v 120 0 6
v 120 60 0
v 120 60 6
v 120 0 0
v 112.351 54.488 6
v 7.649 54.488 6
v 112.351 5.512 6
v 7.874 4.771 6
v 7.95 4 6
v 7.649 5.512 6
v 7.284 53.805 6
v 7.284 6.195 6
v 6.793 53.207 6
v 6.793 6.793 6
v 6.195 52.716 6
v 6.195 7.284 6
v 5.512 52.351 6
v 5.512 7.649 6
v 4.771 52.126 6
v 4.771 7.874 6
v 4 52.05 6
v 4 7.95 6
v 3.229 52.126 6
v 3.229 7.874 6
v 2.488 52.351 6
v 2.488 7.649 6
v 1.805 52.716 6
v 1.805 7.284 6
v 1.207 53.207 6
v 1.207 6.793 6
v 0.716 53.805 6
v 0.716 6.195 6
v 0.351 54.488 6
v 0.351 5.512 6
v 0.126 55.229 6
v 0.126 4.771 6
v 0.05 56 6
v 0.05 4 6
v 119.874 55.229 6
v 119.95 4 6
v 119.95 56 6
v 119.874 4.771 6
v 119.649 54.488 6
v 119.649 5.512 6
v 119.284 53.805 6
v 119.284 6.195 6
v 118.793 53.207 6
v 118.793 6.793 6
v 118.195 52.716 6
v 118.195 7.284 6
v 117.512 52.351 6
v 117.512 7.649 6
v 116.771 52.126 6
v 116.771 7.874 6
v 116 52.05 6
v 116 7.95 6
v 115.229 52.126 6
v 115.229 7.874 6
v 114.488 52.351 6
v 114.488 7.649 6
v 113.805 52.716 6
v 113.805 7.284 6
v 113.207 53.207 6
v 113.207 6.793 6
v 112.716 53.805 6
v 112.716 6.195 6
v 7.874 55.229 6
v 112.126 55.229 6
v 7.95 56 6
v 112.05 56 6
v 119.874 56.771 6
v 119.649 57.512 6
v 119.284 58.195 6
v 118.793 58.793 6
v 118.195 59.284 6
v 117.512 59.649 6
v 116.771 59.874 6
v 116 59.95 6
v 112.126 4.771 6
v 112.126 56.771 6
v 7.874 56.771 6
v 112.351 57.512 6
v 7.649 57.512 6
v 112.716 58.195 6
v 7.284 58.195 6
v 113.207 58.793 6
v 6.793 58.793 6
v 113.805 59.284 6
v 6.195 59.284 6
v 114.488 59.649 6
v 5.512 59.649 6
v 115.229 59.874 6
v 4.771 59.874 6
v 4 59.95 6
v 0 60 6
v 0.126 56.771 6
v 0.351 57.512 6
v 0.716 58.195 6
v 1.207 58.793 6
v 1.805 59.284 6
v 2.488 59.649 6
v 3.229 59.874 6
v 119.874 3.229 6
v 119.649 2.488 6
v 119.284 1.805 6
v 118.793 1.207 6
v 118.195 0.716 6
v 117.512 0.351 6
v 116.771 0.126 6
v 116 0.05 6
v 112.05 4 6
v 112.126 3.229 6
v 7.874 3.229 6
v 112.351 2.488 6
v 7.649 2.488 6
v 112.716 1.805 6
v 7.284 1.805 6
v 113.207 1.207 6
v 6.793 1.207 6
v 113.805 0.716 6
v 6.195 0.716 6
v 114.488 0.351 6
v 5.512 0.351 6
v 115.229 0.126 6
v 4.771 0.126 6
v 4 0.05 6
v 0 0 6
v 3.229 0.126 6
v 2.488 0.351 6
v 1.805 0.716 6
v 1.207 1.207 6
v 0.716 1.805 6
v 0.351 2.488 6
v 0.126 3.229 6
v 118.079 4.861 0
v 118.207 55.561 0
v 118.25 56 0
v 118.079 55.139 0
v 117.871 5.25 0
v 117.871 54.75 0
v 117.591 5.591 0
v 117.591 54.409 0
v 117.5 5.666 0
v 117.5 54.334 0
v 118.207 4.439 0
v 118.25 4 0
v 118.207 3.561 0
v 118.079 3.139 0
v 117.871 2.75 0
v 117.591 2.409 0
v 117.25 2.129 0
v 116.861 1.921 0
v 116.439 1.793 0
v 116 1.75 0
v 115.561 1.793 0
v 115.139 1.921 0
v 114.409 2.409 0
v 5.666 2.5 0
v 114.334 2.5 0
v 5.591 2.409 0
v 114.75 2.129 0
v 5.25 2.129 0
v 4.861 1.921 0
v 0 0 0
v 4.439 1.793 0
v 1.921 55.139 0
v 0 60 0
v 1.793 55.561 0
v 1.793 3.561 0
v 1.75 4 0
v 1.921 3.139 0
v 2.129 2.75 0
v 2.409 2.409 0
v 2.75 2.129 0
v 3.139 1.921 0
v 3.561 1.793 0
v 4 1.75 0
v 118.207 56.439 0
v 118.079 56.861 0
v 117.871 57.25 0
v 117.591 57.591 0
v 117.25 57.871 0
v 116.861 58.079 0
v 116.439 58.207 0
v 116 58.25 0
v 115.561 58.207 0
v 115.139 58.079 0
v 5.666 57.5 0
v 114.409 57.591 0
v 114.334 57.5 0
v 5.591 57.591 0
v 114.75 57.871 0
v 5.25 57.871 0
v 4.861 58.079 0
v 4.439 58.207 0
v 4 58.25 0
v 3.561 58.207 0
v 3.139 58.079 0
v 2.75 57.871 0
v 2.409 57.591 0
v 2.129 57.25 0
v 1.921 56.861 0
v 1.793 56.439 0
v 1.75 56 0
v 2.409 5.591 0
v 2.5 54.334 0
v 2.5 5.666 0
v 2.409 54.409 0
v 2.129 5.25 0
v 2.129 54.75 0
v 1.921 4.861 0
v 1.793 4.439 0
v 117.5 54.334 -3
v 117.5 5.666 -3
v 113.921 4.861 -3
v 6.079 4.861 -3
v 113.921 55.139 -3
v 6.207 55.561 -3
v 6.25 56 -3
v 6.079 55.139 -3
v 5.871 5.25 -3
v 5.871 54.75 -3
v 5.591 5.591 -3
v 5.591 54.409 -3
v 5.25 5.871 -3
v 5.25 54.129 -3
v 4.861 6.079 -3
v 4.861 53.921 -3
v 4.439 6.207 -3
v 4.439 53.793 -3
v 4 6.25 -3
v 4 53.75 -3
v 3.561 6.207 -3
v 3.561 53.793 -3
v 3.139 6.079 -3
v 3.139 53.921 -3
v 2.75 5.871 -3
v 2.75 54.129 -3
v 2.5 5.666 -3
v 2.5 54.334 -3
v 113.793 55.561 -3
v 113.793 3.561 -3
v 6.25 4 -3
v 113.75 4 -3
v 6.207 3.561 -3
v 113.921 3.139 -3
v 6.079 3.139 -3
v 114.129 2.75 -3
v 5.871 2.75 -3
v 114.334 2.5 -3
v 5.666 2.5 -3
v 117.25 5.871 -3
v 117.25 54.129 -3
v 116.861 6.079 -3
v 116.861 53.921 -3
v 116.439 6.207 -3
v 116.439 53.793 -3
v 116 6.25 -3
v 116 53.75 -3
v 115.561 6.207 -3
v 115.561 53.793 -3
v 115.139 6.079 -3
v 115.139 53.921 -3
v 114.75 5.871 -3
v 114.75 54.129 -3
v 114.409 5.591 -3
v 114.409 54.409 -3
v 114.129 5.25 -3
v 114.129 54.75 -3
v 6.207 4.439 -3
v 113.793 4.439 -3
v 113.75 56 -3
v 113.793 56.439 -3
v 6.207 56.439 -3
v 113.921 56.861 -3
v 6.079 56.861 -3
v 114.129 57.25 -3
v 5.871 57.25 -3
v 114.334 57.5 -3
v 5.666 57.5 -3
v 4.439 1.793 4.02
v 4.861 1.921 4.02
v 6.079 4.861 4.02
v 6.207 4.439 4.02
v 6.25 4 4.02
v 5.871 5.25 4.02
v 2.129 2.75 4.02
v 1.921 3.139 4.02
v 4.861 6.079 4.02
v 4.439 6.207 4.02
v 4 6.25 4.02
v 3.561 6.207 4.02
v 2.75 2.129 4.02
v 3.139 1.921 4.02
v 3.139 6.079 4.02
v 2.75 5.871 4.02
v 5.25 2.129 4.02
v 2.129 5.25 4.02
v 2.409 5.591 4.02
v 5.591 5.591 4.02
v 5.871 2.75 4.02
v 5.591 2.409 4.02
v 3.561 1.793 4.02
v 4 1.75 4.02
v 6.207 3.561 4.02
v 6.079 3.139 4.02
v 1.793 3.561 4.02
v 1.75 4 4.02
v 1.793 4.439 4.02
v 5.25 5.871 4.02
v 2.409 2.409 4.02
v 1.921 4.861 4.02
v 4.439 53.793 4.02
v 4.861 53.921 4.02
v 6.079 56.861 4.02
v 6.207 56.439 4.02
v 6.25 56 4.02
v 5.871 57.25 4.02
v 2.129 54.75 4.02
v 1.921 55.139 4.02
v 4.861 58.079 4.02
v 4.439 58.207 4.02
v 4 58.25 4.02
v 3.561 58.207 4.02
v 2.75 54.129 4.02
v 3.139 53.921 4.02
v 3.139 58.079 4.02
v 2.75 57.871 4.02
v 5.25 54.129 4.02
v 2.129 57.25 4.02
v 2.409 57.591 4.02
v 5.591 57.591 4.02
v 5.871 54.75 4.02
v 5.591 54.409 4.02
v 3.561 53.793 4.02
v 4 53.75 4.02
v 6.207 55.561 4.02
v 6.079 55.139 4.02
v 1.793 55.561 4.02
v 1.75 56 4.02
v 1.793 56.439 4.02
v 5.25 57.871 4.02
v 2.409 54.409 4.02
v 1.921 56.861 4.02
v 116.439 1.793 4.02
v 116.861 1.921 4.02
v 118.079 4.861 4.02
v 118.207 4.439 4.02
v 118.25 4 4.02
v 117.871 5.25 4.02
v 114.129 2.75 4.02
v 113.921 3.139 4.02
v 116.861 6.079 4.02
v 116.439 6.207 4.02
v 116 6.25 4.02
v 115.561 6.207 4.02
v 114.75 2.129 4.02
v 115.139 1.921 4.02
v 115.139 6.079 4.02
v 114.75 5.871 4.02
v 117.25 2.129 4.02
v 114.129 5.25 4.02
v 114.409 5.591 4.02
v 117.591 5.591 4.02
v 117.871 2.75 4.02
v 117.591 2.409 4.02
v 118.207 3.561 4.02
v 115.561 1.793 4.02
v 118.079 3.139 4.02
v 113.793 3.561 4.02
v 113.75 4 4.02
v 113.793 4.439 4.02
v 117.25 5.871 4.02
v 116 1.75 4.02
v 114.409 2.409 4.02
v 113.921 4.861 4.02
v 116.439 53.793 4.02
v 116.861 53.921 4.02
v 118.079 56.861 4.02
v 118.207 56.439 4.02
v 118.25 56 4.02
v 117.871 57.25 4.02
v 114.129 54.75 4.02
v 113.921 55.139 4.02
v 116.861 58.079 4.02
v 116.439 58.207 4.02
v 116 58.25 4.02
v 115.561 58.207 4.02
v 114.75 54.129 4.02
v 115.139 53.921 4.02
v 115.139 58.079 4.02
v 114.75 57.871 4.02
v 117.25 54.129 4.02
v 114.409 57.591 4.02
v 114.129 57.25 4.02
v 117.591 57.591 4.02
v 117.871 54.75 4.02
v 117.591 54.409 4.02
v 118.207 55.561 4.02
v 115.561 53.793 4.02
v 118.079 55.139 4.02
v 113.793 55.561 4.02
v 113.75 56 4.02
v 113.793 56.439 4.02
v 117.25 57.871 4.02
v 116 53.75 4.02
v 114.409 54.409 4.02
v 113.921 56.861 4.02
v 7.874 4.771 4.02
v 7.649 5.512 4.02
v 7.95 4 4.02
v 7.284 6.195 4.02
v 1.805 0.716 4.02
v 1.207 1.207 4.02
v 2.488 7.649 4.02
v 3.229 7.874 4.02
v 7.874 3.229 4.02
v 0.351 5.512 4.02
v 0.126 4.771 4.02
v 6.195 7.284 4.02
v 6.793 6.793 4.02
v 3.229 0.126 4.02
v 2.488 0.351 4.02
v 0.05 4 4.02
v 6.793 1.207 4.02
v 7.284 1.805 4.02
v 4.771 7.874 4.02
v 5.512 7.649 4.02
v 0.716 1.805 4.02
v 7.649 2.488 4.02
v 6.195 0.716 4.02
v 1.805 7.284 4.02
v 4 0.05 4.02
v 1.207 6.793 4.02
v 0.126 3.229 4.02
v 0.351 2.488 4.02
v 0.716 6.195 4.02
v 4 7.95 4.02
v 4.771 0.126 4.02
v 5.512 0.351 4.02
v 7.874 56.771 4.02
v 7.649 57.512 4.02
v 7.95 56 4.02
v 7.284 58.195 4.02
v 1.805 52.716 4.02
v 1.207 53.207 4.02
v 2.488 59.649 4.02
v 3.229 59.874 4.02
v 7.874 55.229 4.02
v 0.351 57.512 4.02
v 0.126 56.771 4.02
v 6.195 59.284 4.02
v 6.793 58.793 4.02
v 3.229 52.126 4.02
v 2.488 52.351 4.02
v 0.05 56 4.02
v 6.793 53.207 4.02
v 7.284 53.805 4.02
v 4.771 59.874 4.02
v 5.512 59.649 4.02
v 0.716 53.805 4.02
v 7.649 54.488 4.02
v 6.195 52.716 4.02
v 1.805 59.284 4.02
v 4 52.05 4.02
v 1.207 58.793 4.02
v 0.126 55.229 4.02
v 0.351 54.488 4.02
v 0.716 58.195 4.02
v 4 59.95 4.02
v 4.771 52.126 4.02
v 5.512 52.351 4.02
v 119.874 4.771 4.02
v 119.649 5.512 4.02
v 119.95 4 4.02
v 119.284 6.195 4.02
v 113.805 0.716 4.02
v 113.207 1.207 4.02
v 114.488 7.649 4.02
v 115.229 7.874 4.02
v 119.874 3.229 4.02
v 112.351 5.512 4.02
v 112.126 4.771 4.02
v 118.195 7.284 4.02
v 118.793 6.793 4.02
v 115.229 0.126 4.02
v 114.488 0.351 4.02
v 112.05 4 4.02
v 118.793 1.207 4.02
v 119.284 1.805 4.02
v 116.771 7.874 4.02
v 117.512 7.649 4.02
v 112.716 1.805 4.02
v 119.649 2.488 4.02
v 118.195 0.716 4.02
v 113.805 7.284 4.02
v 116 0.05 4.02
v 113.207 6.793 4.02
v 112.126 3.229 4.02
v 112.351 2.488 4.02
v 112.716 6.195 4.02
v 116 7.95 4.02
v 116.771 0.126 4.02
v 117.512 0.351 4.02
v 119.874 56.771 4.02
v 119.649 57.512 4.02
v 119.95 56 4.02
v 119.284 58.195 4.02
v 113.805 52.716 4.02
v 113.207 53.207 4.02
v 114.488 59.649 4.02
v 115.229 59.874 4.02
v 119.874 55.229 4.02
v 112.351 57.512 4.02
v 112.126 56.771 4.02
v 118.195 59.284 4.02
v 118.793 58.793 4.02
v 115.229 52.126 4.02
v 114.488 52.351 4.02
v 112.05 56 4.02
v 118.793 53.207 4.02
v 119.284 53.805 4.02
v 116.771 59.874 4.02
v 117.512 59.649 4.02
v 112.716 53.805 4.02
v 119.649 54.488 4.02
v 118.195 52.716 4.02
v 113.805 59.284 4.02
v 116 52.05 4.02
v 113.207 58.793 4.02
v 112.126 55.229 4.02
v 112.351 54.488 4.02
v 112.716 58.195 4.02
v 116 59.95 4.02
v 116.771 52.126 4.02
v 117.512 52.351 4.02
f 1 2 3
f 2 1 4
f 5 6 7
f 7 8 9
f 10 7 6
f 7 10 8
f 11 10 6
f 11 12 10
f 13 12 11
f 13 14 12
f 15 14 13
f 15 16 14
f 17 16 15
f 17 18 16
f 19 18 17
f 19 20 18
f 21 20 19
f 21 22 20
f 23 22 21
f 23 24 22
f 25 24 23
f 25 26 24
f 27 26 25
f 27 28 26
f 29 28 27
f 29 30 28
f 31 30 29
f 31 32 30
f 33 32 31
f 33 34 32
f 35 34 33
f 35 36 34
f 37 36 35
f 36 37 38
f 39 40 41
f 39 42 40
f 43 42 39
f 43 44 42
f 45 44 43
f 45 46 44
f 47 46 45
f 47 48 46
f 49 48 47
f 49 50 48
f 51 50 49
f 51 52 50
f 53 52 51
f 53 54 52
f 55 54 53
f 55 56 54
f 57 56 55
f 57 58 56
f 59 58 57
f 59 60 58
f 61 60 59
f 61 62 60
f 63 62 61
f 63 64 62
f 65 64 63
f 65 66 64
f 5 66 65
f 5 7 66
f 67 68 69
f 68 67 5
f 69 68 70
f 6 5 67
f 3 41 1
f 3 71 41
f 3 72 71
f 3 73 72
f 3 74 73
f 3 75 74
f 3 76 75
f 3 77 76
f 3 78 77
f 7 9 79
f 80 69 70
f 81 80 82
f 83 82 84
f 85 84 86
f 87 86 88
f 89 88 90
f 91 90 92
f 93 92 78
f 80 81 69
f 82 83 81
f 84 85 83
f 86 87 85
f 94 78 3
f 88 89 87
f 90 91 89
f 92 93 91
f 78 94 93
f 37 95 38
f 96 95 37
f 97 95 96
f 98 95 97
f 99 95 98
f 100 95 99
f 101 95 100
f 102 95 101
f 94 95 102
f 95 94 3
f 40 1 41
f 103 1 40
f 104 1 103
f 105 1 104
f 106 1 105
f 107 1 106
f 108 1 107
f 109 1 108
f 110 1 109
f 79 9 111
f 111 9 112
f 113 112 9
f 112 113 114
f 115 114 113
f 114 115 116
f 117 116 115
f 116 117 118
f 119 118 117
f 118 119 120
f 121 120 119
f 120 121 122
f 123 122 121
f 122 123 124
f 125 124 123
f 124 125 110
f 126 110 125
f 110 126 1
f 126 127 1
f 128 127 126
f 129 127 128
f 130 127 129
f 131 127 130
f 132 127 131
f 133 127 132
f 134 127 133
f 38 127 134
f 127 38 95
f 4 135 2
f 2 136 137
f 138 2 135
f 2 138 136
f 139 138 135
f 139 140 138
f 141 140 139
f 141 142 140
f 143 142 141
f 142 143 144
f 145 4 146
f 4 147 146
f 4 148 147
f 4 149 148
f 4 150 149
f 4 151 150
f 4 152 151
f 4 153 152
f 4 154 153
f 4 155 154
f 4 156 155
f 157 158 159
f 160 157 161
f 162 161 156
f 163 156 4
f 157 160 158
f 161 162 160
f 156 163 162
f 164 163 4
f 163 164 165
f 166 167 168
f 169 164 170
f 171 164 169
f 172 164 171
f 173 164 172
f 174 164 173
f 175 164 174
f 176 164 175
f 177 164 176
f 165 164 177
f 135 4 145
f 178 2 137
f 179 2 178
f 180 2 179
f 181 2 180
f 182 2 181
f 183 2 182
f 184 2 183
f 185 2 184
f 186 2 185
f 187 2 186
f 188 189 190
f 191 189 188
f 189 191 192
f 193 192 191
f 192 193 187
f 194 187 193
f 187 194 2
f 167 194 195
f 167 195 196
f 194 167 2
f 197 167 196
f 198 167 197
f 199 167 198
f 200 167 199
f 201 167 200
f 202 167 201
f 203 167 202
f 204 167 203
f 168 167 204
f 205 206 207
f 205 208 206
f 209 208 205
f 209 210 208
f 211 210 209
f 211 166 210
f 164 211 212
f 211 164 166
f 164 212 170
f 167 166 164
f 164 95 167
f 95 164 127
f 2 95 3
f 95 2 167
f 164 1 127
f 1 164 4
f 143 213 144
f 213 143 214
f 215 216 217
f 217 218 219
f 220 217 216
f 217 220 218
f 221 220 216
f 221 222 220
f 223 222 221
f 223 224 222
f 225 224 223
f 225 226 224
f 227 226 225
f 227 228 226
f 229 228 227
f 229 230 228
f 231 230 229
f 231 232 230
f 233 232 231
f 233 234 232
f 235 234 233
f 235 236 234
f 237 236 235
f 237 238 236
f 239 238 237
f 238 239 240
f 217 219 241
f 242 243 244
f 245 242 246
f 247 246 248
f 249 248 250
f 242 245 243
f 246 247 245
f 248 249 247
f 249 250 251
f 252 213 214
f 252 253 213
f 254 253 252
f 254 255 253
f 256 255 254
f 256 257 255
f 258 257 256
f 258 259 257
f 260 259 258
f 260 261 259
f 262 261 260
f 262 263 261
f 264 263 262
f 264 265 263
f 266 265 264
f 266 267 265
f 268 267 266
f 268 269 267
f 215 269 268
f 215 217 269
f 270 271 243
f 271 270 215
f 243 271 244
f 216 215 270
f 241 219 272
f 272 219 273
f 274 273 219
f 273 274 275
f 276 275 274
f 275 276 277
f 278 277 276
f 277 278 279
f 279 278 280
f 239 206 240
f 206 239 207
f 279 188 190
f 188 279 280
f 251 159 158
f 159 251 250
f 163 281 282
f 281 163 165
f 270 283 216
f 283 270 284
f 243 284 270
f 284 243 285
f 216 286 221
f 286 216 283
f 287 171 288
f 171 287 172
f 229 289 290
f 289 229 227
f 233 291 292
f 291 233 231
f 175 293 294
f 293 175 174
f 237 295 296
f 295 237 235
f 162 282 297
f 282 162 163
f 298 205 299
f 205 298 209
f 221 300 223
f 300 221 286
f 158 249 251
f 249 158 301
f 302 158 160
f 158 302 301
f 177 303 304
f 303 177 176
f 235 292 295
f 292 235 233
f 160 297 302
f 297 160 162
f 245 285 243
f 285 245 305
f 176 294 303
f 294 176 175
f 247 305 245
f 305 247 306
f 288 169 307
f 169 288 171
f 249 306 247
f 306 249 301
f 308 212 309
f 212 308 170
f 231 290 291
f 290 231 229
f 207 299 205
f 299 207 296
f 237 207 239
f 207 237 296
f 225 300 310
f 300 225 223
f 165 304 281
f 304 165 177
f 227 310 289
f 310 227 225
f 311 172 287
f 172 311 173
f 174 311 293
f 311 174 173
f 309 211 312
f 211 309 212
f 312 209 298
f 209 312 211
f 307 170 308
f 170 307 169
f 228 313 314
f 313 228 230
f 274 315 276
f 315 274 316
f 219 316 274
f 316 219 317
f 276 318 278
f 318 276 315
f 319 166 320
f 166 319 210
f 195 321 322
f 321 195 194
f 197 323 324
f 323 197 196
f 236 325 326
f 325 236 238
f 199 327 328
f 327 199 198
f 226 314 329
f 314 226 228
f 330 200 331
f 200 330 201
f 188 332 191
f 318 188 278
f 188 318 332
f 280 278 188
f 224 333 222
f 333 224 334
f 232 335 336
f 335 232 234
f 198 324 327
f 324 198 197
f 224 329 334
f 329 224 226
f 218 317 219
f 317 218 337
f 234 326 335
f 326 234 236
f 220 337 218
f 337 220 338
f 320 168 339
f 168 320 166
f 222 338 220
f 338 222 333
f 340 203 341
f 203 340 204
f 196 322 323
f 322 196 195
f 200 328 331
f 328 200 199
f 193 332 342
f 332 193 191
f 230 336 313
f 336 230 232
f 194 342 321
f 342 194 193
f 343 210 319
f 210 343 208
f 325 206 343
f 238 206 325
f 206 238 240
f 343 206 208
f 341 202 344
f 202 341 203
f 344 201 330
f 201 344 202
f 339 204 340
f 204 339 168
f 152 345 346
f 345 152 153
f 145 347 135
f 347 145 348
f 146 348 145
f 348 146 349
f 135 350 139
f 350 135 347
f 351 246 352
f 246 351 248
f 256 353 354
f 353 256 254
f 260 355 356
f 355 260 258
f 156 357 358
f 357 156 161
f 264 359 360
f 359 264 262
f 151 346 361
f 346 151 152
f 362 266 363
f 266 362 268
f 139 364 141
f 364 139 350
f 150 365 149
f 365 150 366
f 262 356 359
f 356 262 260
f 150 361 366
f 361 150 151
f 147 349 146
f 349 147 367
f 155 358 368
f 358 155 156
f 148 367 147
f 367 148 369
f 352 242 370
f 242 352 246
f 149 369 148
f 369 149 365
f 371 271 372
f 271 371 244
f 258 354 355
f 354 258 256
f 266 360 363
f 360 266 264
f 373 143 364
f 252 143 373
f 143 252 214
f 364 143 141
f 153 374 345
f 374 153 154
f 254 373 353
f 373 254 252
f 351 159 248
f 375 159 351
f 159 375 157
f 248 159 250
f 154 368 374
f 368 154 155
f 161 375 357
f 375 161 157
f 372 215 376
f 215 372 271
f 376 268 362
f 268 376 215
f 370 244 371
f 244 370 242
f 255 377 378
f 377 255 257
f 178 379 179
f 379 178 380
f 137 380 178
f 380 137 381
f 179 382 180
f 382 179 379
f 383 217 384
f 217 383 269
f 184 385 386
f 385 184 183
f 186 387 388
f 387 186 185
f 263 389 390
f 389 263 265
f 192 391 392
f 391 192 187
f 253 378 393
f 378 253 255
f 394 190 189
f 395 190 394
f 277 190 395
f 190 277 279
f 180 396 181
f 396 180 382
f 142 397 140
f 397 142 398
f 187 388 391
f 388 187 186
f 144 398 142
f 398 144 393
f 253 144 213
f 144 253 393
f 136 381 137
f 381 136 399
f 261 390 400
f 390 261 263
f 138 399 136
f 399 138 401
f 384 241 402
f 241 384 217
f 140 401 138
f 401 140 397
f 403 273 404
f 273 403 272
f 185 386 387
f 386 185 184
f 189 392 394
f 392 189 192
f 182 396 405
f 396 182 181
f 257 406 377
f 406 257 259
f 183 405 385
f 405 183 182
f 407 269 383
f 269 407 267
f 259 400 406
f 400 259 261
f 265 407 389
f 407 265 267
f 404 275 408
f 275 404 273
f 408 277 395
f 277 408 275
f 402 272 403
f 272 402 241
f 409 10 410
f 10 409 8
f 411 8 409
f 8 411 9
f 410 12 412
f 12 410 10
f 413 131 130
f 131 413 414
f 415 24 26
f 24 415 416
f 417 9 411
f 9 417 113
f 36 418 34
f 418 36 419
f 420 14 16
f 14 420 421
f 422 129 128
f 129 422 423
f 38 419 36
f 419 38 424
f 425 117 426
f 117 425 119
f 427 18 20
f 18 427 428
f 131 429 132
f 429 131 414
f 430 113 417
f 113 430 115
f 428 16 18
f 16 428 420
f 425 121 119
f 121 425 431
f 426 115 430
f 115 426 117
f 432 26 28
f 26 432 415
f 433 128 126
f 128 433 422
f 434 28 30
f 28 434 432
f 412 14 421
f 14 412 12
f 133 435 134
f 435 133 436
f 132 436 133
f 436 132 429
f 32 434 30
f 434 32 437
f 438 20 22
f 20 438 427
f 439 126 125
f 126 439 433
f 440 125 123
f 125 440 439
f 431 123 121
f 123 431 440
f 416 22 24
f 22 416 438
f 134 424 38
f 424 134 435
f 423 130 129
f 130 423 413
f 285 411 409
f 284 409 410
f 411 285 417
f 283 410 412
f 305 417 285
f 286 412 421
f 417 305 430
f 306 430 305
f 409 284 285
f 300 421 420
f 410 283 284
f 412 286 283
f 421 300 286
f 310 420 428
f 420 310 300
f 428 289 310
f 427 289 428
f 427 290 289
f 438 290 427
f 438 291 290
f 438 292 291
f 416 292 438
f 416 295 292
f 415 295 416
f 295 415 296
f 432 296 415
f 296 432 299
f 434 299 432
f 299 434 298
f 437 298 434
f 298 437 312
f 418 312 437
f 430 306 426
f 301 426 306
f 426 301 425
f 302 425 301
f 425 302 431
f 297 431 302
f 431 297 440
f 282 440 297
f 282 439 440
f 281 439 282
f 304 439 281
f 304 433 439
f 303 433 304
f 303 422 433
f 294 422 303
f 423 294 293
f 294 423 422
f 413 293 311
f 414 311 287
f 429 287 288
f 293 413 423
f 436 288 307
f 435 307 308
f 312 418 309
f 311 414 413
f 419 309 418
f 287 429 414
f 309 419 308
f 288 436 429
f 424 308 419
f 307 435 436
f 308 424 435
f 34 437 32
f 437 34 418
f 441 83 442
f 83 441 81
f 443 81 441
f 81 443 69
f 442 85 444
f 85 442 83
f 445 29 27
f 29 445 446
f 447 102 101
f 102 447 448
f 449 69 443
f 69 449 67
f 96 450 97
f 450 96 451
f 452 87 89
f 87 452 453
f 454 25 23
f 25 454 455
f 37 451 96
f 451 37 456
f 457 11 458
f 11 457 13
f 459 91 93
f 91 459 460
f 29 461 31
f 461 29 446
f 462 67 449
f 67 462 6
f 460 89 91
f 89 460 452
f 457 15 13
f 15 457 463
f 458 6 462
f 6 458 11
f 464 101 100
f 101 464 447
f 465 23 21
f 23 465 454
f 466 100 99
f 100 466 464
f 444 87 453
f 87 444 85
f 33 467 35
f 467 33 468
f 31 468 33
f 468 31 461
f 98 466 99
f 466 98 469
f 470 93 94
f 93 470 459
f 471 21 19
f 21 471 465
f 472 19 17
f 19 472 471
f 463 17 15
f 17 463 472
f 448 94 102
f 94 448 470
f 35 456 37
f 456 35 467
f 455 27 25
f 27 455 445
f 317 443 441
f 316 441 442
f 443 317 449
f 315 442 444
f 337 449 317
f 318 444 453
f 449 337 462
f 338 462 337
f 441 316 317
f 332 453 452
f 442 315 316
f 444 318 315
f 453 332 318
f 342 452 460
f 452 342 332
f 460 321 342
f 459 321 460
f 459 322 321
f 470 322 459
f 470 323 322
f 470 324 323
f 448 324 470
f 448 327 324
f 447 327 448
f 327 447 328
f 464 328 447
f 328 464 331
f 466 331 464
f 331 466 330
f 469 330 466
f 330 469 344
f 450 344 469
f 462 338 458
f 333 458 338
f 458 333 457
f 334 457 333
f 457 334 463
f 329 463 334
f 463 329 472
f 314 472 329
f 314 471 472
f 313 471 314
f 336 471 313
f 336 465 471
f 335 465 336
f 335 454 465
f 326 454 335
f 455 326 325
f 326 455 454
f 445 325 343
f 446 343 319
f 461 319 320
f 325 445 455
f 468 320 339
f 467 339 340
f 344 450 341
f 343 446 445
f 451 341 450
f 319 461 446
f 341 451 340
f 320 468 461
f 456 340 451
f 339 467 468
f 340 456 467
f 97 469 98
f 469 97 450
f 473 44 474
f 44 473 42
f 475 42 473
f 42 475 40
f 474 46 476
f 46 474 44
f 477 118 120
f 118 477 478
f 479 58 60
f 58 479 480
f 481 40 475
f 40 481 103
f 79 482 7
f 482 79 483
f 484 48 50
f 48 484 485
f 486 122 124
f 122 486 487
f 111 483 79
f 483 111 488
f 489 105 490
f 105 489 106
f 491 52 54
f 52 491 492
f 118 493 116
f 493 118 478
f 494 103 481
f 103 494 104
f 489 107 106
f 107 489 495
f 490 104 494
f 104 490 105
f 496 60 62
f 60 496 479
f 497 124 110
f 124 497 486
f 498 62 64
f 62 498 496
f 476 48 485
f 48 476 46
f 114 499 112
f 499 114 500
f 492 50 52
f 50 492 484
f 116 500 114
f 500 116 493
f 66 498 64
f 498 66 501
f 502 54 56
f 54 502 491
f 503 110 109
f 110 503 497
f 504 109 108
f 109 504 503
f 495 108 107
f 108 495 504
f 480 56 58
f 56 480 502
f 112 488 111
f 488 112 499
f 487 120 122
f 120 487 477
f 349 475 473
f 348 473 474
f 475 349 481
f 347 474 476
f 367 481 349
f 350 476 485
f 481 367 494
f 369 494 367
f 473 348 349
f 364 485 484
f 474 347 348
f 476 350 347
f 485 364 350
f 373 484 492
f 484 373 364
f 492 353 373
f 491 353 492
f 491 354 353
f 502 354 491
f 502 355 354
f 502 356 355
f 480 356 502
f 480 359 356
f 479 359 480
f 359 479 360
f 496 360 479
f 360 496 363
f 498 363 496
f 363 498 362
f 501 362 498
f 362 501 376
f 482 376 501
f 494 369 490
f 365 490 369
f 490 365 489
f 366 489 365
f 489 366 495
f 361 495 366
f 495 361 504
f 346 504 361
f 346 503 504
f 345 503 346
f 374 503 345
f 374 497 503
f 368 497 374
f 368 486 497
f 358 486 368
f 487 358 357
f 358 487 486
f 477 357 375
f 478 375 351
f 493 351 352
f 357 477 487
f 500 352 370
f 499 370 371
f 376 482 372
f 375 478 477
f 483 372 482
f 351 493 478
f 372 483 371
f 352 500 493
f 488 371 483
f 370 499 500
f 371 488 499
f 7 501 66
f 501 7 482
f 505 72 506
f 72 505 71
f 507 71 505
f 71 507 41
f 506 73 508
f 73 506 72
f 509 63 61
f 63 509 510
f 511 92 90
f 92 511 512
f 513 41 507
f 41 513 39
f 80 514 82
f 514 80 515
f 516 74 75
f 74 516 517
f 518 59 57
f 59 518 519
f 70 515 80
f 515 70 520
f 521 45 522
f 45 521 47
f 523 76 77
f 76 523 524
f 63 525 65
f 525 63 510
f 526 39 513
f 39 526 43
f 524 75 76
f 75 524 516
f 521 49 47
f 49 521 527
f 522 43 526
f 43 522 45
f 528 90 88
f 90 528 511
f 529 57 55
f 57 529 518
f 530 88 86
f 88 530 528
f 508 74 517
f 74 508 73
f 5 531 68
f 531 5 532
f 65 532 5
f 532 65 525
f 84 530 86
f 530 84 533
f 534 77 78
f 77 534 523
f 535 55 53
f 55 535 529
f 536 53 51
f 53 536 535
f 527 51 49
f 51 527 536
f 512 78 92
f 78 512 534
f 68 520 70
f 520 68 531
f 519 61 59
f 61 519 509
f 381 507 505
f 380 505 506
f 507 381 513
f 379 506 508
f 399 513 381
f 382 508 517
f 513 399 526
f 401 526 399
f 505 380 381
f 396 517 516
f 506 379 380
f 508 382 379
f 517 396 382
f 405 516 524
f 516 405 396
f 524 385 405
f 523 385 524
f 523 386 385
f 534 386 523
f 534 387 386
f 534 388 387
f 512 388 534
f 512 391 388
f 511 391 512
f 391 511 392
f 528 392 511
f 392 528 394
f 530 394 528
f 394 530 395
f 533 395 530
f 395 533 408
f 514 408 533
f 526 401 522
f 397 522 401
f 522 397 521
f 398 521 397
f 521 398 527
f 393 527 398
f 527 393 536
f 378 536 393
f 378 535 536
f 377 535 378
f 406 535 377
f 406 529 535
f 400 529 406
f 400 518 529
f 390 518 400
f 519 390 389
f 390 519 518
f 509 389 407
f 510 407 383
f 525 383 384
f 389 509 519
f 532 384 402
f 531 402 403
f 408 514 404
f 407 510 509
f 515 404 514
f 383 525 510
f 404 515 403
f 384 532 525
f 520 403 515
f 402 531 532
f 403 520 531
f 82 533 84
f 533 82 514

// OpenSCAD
$fn = 32;

// ----------------------------------------------------------------------
// Enclosure lid: 120 x 60 x 6 mm, 4 bolt holes
// ----------------------------------------------------------------------

// --- parameters (mm) ---
length = 120;             // lid length, X
width = 60;               // lid width, Y
plate_t = 6;              // lid plate thickness
bolt_d = 4.5;             // bolt clearance
boss_lip = 4;             // bolt hole inset from the corner
sink = 1;                 // overlap of the lip and ribs into the plate
lip_h = 4;                // lip height below the plate
lip_wall = 2.5;           // lip wall thickness
cs_d = 7.9;               // countersink diameter
cs_h = 1.98;              // countersink depth

module plate() {
  cube([length, width, plate_t]);
  /* lip that drops into the housing opening, sunk into the plate */
  translate([lip_wall, lip_wall, -lip_h + sink]) cube([length - 2 * lip_wall, width - 2 * lip_wall, lip_h]);
}

difference() {
  plate();
  /* bolt pattern matching the corner bosses */
  for (sx = [0, 1]) for (sy = [0, 1])
    translate([sx * (length - 2 * boss_lip) + boss_lip, sy * (width - 2 * boss_lip) + boss_lip, -lip_h - 1])
      cylinder(h = plate_t + lip_h + 2, d = bolt_d);
  /* countersinks so the heads sit flush */
  for (sx = [0, 1]) for (sy = [0, 1])
    translate([sx * (length - 2 * boss_lip) + boss_lip, sy * (width - 2 * boss_lip) + boss_lip, plate_t - cs_h])
      cylinder(h = cs_h + 0.5, d = cs_d);
}
